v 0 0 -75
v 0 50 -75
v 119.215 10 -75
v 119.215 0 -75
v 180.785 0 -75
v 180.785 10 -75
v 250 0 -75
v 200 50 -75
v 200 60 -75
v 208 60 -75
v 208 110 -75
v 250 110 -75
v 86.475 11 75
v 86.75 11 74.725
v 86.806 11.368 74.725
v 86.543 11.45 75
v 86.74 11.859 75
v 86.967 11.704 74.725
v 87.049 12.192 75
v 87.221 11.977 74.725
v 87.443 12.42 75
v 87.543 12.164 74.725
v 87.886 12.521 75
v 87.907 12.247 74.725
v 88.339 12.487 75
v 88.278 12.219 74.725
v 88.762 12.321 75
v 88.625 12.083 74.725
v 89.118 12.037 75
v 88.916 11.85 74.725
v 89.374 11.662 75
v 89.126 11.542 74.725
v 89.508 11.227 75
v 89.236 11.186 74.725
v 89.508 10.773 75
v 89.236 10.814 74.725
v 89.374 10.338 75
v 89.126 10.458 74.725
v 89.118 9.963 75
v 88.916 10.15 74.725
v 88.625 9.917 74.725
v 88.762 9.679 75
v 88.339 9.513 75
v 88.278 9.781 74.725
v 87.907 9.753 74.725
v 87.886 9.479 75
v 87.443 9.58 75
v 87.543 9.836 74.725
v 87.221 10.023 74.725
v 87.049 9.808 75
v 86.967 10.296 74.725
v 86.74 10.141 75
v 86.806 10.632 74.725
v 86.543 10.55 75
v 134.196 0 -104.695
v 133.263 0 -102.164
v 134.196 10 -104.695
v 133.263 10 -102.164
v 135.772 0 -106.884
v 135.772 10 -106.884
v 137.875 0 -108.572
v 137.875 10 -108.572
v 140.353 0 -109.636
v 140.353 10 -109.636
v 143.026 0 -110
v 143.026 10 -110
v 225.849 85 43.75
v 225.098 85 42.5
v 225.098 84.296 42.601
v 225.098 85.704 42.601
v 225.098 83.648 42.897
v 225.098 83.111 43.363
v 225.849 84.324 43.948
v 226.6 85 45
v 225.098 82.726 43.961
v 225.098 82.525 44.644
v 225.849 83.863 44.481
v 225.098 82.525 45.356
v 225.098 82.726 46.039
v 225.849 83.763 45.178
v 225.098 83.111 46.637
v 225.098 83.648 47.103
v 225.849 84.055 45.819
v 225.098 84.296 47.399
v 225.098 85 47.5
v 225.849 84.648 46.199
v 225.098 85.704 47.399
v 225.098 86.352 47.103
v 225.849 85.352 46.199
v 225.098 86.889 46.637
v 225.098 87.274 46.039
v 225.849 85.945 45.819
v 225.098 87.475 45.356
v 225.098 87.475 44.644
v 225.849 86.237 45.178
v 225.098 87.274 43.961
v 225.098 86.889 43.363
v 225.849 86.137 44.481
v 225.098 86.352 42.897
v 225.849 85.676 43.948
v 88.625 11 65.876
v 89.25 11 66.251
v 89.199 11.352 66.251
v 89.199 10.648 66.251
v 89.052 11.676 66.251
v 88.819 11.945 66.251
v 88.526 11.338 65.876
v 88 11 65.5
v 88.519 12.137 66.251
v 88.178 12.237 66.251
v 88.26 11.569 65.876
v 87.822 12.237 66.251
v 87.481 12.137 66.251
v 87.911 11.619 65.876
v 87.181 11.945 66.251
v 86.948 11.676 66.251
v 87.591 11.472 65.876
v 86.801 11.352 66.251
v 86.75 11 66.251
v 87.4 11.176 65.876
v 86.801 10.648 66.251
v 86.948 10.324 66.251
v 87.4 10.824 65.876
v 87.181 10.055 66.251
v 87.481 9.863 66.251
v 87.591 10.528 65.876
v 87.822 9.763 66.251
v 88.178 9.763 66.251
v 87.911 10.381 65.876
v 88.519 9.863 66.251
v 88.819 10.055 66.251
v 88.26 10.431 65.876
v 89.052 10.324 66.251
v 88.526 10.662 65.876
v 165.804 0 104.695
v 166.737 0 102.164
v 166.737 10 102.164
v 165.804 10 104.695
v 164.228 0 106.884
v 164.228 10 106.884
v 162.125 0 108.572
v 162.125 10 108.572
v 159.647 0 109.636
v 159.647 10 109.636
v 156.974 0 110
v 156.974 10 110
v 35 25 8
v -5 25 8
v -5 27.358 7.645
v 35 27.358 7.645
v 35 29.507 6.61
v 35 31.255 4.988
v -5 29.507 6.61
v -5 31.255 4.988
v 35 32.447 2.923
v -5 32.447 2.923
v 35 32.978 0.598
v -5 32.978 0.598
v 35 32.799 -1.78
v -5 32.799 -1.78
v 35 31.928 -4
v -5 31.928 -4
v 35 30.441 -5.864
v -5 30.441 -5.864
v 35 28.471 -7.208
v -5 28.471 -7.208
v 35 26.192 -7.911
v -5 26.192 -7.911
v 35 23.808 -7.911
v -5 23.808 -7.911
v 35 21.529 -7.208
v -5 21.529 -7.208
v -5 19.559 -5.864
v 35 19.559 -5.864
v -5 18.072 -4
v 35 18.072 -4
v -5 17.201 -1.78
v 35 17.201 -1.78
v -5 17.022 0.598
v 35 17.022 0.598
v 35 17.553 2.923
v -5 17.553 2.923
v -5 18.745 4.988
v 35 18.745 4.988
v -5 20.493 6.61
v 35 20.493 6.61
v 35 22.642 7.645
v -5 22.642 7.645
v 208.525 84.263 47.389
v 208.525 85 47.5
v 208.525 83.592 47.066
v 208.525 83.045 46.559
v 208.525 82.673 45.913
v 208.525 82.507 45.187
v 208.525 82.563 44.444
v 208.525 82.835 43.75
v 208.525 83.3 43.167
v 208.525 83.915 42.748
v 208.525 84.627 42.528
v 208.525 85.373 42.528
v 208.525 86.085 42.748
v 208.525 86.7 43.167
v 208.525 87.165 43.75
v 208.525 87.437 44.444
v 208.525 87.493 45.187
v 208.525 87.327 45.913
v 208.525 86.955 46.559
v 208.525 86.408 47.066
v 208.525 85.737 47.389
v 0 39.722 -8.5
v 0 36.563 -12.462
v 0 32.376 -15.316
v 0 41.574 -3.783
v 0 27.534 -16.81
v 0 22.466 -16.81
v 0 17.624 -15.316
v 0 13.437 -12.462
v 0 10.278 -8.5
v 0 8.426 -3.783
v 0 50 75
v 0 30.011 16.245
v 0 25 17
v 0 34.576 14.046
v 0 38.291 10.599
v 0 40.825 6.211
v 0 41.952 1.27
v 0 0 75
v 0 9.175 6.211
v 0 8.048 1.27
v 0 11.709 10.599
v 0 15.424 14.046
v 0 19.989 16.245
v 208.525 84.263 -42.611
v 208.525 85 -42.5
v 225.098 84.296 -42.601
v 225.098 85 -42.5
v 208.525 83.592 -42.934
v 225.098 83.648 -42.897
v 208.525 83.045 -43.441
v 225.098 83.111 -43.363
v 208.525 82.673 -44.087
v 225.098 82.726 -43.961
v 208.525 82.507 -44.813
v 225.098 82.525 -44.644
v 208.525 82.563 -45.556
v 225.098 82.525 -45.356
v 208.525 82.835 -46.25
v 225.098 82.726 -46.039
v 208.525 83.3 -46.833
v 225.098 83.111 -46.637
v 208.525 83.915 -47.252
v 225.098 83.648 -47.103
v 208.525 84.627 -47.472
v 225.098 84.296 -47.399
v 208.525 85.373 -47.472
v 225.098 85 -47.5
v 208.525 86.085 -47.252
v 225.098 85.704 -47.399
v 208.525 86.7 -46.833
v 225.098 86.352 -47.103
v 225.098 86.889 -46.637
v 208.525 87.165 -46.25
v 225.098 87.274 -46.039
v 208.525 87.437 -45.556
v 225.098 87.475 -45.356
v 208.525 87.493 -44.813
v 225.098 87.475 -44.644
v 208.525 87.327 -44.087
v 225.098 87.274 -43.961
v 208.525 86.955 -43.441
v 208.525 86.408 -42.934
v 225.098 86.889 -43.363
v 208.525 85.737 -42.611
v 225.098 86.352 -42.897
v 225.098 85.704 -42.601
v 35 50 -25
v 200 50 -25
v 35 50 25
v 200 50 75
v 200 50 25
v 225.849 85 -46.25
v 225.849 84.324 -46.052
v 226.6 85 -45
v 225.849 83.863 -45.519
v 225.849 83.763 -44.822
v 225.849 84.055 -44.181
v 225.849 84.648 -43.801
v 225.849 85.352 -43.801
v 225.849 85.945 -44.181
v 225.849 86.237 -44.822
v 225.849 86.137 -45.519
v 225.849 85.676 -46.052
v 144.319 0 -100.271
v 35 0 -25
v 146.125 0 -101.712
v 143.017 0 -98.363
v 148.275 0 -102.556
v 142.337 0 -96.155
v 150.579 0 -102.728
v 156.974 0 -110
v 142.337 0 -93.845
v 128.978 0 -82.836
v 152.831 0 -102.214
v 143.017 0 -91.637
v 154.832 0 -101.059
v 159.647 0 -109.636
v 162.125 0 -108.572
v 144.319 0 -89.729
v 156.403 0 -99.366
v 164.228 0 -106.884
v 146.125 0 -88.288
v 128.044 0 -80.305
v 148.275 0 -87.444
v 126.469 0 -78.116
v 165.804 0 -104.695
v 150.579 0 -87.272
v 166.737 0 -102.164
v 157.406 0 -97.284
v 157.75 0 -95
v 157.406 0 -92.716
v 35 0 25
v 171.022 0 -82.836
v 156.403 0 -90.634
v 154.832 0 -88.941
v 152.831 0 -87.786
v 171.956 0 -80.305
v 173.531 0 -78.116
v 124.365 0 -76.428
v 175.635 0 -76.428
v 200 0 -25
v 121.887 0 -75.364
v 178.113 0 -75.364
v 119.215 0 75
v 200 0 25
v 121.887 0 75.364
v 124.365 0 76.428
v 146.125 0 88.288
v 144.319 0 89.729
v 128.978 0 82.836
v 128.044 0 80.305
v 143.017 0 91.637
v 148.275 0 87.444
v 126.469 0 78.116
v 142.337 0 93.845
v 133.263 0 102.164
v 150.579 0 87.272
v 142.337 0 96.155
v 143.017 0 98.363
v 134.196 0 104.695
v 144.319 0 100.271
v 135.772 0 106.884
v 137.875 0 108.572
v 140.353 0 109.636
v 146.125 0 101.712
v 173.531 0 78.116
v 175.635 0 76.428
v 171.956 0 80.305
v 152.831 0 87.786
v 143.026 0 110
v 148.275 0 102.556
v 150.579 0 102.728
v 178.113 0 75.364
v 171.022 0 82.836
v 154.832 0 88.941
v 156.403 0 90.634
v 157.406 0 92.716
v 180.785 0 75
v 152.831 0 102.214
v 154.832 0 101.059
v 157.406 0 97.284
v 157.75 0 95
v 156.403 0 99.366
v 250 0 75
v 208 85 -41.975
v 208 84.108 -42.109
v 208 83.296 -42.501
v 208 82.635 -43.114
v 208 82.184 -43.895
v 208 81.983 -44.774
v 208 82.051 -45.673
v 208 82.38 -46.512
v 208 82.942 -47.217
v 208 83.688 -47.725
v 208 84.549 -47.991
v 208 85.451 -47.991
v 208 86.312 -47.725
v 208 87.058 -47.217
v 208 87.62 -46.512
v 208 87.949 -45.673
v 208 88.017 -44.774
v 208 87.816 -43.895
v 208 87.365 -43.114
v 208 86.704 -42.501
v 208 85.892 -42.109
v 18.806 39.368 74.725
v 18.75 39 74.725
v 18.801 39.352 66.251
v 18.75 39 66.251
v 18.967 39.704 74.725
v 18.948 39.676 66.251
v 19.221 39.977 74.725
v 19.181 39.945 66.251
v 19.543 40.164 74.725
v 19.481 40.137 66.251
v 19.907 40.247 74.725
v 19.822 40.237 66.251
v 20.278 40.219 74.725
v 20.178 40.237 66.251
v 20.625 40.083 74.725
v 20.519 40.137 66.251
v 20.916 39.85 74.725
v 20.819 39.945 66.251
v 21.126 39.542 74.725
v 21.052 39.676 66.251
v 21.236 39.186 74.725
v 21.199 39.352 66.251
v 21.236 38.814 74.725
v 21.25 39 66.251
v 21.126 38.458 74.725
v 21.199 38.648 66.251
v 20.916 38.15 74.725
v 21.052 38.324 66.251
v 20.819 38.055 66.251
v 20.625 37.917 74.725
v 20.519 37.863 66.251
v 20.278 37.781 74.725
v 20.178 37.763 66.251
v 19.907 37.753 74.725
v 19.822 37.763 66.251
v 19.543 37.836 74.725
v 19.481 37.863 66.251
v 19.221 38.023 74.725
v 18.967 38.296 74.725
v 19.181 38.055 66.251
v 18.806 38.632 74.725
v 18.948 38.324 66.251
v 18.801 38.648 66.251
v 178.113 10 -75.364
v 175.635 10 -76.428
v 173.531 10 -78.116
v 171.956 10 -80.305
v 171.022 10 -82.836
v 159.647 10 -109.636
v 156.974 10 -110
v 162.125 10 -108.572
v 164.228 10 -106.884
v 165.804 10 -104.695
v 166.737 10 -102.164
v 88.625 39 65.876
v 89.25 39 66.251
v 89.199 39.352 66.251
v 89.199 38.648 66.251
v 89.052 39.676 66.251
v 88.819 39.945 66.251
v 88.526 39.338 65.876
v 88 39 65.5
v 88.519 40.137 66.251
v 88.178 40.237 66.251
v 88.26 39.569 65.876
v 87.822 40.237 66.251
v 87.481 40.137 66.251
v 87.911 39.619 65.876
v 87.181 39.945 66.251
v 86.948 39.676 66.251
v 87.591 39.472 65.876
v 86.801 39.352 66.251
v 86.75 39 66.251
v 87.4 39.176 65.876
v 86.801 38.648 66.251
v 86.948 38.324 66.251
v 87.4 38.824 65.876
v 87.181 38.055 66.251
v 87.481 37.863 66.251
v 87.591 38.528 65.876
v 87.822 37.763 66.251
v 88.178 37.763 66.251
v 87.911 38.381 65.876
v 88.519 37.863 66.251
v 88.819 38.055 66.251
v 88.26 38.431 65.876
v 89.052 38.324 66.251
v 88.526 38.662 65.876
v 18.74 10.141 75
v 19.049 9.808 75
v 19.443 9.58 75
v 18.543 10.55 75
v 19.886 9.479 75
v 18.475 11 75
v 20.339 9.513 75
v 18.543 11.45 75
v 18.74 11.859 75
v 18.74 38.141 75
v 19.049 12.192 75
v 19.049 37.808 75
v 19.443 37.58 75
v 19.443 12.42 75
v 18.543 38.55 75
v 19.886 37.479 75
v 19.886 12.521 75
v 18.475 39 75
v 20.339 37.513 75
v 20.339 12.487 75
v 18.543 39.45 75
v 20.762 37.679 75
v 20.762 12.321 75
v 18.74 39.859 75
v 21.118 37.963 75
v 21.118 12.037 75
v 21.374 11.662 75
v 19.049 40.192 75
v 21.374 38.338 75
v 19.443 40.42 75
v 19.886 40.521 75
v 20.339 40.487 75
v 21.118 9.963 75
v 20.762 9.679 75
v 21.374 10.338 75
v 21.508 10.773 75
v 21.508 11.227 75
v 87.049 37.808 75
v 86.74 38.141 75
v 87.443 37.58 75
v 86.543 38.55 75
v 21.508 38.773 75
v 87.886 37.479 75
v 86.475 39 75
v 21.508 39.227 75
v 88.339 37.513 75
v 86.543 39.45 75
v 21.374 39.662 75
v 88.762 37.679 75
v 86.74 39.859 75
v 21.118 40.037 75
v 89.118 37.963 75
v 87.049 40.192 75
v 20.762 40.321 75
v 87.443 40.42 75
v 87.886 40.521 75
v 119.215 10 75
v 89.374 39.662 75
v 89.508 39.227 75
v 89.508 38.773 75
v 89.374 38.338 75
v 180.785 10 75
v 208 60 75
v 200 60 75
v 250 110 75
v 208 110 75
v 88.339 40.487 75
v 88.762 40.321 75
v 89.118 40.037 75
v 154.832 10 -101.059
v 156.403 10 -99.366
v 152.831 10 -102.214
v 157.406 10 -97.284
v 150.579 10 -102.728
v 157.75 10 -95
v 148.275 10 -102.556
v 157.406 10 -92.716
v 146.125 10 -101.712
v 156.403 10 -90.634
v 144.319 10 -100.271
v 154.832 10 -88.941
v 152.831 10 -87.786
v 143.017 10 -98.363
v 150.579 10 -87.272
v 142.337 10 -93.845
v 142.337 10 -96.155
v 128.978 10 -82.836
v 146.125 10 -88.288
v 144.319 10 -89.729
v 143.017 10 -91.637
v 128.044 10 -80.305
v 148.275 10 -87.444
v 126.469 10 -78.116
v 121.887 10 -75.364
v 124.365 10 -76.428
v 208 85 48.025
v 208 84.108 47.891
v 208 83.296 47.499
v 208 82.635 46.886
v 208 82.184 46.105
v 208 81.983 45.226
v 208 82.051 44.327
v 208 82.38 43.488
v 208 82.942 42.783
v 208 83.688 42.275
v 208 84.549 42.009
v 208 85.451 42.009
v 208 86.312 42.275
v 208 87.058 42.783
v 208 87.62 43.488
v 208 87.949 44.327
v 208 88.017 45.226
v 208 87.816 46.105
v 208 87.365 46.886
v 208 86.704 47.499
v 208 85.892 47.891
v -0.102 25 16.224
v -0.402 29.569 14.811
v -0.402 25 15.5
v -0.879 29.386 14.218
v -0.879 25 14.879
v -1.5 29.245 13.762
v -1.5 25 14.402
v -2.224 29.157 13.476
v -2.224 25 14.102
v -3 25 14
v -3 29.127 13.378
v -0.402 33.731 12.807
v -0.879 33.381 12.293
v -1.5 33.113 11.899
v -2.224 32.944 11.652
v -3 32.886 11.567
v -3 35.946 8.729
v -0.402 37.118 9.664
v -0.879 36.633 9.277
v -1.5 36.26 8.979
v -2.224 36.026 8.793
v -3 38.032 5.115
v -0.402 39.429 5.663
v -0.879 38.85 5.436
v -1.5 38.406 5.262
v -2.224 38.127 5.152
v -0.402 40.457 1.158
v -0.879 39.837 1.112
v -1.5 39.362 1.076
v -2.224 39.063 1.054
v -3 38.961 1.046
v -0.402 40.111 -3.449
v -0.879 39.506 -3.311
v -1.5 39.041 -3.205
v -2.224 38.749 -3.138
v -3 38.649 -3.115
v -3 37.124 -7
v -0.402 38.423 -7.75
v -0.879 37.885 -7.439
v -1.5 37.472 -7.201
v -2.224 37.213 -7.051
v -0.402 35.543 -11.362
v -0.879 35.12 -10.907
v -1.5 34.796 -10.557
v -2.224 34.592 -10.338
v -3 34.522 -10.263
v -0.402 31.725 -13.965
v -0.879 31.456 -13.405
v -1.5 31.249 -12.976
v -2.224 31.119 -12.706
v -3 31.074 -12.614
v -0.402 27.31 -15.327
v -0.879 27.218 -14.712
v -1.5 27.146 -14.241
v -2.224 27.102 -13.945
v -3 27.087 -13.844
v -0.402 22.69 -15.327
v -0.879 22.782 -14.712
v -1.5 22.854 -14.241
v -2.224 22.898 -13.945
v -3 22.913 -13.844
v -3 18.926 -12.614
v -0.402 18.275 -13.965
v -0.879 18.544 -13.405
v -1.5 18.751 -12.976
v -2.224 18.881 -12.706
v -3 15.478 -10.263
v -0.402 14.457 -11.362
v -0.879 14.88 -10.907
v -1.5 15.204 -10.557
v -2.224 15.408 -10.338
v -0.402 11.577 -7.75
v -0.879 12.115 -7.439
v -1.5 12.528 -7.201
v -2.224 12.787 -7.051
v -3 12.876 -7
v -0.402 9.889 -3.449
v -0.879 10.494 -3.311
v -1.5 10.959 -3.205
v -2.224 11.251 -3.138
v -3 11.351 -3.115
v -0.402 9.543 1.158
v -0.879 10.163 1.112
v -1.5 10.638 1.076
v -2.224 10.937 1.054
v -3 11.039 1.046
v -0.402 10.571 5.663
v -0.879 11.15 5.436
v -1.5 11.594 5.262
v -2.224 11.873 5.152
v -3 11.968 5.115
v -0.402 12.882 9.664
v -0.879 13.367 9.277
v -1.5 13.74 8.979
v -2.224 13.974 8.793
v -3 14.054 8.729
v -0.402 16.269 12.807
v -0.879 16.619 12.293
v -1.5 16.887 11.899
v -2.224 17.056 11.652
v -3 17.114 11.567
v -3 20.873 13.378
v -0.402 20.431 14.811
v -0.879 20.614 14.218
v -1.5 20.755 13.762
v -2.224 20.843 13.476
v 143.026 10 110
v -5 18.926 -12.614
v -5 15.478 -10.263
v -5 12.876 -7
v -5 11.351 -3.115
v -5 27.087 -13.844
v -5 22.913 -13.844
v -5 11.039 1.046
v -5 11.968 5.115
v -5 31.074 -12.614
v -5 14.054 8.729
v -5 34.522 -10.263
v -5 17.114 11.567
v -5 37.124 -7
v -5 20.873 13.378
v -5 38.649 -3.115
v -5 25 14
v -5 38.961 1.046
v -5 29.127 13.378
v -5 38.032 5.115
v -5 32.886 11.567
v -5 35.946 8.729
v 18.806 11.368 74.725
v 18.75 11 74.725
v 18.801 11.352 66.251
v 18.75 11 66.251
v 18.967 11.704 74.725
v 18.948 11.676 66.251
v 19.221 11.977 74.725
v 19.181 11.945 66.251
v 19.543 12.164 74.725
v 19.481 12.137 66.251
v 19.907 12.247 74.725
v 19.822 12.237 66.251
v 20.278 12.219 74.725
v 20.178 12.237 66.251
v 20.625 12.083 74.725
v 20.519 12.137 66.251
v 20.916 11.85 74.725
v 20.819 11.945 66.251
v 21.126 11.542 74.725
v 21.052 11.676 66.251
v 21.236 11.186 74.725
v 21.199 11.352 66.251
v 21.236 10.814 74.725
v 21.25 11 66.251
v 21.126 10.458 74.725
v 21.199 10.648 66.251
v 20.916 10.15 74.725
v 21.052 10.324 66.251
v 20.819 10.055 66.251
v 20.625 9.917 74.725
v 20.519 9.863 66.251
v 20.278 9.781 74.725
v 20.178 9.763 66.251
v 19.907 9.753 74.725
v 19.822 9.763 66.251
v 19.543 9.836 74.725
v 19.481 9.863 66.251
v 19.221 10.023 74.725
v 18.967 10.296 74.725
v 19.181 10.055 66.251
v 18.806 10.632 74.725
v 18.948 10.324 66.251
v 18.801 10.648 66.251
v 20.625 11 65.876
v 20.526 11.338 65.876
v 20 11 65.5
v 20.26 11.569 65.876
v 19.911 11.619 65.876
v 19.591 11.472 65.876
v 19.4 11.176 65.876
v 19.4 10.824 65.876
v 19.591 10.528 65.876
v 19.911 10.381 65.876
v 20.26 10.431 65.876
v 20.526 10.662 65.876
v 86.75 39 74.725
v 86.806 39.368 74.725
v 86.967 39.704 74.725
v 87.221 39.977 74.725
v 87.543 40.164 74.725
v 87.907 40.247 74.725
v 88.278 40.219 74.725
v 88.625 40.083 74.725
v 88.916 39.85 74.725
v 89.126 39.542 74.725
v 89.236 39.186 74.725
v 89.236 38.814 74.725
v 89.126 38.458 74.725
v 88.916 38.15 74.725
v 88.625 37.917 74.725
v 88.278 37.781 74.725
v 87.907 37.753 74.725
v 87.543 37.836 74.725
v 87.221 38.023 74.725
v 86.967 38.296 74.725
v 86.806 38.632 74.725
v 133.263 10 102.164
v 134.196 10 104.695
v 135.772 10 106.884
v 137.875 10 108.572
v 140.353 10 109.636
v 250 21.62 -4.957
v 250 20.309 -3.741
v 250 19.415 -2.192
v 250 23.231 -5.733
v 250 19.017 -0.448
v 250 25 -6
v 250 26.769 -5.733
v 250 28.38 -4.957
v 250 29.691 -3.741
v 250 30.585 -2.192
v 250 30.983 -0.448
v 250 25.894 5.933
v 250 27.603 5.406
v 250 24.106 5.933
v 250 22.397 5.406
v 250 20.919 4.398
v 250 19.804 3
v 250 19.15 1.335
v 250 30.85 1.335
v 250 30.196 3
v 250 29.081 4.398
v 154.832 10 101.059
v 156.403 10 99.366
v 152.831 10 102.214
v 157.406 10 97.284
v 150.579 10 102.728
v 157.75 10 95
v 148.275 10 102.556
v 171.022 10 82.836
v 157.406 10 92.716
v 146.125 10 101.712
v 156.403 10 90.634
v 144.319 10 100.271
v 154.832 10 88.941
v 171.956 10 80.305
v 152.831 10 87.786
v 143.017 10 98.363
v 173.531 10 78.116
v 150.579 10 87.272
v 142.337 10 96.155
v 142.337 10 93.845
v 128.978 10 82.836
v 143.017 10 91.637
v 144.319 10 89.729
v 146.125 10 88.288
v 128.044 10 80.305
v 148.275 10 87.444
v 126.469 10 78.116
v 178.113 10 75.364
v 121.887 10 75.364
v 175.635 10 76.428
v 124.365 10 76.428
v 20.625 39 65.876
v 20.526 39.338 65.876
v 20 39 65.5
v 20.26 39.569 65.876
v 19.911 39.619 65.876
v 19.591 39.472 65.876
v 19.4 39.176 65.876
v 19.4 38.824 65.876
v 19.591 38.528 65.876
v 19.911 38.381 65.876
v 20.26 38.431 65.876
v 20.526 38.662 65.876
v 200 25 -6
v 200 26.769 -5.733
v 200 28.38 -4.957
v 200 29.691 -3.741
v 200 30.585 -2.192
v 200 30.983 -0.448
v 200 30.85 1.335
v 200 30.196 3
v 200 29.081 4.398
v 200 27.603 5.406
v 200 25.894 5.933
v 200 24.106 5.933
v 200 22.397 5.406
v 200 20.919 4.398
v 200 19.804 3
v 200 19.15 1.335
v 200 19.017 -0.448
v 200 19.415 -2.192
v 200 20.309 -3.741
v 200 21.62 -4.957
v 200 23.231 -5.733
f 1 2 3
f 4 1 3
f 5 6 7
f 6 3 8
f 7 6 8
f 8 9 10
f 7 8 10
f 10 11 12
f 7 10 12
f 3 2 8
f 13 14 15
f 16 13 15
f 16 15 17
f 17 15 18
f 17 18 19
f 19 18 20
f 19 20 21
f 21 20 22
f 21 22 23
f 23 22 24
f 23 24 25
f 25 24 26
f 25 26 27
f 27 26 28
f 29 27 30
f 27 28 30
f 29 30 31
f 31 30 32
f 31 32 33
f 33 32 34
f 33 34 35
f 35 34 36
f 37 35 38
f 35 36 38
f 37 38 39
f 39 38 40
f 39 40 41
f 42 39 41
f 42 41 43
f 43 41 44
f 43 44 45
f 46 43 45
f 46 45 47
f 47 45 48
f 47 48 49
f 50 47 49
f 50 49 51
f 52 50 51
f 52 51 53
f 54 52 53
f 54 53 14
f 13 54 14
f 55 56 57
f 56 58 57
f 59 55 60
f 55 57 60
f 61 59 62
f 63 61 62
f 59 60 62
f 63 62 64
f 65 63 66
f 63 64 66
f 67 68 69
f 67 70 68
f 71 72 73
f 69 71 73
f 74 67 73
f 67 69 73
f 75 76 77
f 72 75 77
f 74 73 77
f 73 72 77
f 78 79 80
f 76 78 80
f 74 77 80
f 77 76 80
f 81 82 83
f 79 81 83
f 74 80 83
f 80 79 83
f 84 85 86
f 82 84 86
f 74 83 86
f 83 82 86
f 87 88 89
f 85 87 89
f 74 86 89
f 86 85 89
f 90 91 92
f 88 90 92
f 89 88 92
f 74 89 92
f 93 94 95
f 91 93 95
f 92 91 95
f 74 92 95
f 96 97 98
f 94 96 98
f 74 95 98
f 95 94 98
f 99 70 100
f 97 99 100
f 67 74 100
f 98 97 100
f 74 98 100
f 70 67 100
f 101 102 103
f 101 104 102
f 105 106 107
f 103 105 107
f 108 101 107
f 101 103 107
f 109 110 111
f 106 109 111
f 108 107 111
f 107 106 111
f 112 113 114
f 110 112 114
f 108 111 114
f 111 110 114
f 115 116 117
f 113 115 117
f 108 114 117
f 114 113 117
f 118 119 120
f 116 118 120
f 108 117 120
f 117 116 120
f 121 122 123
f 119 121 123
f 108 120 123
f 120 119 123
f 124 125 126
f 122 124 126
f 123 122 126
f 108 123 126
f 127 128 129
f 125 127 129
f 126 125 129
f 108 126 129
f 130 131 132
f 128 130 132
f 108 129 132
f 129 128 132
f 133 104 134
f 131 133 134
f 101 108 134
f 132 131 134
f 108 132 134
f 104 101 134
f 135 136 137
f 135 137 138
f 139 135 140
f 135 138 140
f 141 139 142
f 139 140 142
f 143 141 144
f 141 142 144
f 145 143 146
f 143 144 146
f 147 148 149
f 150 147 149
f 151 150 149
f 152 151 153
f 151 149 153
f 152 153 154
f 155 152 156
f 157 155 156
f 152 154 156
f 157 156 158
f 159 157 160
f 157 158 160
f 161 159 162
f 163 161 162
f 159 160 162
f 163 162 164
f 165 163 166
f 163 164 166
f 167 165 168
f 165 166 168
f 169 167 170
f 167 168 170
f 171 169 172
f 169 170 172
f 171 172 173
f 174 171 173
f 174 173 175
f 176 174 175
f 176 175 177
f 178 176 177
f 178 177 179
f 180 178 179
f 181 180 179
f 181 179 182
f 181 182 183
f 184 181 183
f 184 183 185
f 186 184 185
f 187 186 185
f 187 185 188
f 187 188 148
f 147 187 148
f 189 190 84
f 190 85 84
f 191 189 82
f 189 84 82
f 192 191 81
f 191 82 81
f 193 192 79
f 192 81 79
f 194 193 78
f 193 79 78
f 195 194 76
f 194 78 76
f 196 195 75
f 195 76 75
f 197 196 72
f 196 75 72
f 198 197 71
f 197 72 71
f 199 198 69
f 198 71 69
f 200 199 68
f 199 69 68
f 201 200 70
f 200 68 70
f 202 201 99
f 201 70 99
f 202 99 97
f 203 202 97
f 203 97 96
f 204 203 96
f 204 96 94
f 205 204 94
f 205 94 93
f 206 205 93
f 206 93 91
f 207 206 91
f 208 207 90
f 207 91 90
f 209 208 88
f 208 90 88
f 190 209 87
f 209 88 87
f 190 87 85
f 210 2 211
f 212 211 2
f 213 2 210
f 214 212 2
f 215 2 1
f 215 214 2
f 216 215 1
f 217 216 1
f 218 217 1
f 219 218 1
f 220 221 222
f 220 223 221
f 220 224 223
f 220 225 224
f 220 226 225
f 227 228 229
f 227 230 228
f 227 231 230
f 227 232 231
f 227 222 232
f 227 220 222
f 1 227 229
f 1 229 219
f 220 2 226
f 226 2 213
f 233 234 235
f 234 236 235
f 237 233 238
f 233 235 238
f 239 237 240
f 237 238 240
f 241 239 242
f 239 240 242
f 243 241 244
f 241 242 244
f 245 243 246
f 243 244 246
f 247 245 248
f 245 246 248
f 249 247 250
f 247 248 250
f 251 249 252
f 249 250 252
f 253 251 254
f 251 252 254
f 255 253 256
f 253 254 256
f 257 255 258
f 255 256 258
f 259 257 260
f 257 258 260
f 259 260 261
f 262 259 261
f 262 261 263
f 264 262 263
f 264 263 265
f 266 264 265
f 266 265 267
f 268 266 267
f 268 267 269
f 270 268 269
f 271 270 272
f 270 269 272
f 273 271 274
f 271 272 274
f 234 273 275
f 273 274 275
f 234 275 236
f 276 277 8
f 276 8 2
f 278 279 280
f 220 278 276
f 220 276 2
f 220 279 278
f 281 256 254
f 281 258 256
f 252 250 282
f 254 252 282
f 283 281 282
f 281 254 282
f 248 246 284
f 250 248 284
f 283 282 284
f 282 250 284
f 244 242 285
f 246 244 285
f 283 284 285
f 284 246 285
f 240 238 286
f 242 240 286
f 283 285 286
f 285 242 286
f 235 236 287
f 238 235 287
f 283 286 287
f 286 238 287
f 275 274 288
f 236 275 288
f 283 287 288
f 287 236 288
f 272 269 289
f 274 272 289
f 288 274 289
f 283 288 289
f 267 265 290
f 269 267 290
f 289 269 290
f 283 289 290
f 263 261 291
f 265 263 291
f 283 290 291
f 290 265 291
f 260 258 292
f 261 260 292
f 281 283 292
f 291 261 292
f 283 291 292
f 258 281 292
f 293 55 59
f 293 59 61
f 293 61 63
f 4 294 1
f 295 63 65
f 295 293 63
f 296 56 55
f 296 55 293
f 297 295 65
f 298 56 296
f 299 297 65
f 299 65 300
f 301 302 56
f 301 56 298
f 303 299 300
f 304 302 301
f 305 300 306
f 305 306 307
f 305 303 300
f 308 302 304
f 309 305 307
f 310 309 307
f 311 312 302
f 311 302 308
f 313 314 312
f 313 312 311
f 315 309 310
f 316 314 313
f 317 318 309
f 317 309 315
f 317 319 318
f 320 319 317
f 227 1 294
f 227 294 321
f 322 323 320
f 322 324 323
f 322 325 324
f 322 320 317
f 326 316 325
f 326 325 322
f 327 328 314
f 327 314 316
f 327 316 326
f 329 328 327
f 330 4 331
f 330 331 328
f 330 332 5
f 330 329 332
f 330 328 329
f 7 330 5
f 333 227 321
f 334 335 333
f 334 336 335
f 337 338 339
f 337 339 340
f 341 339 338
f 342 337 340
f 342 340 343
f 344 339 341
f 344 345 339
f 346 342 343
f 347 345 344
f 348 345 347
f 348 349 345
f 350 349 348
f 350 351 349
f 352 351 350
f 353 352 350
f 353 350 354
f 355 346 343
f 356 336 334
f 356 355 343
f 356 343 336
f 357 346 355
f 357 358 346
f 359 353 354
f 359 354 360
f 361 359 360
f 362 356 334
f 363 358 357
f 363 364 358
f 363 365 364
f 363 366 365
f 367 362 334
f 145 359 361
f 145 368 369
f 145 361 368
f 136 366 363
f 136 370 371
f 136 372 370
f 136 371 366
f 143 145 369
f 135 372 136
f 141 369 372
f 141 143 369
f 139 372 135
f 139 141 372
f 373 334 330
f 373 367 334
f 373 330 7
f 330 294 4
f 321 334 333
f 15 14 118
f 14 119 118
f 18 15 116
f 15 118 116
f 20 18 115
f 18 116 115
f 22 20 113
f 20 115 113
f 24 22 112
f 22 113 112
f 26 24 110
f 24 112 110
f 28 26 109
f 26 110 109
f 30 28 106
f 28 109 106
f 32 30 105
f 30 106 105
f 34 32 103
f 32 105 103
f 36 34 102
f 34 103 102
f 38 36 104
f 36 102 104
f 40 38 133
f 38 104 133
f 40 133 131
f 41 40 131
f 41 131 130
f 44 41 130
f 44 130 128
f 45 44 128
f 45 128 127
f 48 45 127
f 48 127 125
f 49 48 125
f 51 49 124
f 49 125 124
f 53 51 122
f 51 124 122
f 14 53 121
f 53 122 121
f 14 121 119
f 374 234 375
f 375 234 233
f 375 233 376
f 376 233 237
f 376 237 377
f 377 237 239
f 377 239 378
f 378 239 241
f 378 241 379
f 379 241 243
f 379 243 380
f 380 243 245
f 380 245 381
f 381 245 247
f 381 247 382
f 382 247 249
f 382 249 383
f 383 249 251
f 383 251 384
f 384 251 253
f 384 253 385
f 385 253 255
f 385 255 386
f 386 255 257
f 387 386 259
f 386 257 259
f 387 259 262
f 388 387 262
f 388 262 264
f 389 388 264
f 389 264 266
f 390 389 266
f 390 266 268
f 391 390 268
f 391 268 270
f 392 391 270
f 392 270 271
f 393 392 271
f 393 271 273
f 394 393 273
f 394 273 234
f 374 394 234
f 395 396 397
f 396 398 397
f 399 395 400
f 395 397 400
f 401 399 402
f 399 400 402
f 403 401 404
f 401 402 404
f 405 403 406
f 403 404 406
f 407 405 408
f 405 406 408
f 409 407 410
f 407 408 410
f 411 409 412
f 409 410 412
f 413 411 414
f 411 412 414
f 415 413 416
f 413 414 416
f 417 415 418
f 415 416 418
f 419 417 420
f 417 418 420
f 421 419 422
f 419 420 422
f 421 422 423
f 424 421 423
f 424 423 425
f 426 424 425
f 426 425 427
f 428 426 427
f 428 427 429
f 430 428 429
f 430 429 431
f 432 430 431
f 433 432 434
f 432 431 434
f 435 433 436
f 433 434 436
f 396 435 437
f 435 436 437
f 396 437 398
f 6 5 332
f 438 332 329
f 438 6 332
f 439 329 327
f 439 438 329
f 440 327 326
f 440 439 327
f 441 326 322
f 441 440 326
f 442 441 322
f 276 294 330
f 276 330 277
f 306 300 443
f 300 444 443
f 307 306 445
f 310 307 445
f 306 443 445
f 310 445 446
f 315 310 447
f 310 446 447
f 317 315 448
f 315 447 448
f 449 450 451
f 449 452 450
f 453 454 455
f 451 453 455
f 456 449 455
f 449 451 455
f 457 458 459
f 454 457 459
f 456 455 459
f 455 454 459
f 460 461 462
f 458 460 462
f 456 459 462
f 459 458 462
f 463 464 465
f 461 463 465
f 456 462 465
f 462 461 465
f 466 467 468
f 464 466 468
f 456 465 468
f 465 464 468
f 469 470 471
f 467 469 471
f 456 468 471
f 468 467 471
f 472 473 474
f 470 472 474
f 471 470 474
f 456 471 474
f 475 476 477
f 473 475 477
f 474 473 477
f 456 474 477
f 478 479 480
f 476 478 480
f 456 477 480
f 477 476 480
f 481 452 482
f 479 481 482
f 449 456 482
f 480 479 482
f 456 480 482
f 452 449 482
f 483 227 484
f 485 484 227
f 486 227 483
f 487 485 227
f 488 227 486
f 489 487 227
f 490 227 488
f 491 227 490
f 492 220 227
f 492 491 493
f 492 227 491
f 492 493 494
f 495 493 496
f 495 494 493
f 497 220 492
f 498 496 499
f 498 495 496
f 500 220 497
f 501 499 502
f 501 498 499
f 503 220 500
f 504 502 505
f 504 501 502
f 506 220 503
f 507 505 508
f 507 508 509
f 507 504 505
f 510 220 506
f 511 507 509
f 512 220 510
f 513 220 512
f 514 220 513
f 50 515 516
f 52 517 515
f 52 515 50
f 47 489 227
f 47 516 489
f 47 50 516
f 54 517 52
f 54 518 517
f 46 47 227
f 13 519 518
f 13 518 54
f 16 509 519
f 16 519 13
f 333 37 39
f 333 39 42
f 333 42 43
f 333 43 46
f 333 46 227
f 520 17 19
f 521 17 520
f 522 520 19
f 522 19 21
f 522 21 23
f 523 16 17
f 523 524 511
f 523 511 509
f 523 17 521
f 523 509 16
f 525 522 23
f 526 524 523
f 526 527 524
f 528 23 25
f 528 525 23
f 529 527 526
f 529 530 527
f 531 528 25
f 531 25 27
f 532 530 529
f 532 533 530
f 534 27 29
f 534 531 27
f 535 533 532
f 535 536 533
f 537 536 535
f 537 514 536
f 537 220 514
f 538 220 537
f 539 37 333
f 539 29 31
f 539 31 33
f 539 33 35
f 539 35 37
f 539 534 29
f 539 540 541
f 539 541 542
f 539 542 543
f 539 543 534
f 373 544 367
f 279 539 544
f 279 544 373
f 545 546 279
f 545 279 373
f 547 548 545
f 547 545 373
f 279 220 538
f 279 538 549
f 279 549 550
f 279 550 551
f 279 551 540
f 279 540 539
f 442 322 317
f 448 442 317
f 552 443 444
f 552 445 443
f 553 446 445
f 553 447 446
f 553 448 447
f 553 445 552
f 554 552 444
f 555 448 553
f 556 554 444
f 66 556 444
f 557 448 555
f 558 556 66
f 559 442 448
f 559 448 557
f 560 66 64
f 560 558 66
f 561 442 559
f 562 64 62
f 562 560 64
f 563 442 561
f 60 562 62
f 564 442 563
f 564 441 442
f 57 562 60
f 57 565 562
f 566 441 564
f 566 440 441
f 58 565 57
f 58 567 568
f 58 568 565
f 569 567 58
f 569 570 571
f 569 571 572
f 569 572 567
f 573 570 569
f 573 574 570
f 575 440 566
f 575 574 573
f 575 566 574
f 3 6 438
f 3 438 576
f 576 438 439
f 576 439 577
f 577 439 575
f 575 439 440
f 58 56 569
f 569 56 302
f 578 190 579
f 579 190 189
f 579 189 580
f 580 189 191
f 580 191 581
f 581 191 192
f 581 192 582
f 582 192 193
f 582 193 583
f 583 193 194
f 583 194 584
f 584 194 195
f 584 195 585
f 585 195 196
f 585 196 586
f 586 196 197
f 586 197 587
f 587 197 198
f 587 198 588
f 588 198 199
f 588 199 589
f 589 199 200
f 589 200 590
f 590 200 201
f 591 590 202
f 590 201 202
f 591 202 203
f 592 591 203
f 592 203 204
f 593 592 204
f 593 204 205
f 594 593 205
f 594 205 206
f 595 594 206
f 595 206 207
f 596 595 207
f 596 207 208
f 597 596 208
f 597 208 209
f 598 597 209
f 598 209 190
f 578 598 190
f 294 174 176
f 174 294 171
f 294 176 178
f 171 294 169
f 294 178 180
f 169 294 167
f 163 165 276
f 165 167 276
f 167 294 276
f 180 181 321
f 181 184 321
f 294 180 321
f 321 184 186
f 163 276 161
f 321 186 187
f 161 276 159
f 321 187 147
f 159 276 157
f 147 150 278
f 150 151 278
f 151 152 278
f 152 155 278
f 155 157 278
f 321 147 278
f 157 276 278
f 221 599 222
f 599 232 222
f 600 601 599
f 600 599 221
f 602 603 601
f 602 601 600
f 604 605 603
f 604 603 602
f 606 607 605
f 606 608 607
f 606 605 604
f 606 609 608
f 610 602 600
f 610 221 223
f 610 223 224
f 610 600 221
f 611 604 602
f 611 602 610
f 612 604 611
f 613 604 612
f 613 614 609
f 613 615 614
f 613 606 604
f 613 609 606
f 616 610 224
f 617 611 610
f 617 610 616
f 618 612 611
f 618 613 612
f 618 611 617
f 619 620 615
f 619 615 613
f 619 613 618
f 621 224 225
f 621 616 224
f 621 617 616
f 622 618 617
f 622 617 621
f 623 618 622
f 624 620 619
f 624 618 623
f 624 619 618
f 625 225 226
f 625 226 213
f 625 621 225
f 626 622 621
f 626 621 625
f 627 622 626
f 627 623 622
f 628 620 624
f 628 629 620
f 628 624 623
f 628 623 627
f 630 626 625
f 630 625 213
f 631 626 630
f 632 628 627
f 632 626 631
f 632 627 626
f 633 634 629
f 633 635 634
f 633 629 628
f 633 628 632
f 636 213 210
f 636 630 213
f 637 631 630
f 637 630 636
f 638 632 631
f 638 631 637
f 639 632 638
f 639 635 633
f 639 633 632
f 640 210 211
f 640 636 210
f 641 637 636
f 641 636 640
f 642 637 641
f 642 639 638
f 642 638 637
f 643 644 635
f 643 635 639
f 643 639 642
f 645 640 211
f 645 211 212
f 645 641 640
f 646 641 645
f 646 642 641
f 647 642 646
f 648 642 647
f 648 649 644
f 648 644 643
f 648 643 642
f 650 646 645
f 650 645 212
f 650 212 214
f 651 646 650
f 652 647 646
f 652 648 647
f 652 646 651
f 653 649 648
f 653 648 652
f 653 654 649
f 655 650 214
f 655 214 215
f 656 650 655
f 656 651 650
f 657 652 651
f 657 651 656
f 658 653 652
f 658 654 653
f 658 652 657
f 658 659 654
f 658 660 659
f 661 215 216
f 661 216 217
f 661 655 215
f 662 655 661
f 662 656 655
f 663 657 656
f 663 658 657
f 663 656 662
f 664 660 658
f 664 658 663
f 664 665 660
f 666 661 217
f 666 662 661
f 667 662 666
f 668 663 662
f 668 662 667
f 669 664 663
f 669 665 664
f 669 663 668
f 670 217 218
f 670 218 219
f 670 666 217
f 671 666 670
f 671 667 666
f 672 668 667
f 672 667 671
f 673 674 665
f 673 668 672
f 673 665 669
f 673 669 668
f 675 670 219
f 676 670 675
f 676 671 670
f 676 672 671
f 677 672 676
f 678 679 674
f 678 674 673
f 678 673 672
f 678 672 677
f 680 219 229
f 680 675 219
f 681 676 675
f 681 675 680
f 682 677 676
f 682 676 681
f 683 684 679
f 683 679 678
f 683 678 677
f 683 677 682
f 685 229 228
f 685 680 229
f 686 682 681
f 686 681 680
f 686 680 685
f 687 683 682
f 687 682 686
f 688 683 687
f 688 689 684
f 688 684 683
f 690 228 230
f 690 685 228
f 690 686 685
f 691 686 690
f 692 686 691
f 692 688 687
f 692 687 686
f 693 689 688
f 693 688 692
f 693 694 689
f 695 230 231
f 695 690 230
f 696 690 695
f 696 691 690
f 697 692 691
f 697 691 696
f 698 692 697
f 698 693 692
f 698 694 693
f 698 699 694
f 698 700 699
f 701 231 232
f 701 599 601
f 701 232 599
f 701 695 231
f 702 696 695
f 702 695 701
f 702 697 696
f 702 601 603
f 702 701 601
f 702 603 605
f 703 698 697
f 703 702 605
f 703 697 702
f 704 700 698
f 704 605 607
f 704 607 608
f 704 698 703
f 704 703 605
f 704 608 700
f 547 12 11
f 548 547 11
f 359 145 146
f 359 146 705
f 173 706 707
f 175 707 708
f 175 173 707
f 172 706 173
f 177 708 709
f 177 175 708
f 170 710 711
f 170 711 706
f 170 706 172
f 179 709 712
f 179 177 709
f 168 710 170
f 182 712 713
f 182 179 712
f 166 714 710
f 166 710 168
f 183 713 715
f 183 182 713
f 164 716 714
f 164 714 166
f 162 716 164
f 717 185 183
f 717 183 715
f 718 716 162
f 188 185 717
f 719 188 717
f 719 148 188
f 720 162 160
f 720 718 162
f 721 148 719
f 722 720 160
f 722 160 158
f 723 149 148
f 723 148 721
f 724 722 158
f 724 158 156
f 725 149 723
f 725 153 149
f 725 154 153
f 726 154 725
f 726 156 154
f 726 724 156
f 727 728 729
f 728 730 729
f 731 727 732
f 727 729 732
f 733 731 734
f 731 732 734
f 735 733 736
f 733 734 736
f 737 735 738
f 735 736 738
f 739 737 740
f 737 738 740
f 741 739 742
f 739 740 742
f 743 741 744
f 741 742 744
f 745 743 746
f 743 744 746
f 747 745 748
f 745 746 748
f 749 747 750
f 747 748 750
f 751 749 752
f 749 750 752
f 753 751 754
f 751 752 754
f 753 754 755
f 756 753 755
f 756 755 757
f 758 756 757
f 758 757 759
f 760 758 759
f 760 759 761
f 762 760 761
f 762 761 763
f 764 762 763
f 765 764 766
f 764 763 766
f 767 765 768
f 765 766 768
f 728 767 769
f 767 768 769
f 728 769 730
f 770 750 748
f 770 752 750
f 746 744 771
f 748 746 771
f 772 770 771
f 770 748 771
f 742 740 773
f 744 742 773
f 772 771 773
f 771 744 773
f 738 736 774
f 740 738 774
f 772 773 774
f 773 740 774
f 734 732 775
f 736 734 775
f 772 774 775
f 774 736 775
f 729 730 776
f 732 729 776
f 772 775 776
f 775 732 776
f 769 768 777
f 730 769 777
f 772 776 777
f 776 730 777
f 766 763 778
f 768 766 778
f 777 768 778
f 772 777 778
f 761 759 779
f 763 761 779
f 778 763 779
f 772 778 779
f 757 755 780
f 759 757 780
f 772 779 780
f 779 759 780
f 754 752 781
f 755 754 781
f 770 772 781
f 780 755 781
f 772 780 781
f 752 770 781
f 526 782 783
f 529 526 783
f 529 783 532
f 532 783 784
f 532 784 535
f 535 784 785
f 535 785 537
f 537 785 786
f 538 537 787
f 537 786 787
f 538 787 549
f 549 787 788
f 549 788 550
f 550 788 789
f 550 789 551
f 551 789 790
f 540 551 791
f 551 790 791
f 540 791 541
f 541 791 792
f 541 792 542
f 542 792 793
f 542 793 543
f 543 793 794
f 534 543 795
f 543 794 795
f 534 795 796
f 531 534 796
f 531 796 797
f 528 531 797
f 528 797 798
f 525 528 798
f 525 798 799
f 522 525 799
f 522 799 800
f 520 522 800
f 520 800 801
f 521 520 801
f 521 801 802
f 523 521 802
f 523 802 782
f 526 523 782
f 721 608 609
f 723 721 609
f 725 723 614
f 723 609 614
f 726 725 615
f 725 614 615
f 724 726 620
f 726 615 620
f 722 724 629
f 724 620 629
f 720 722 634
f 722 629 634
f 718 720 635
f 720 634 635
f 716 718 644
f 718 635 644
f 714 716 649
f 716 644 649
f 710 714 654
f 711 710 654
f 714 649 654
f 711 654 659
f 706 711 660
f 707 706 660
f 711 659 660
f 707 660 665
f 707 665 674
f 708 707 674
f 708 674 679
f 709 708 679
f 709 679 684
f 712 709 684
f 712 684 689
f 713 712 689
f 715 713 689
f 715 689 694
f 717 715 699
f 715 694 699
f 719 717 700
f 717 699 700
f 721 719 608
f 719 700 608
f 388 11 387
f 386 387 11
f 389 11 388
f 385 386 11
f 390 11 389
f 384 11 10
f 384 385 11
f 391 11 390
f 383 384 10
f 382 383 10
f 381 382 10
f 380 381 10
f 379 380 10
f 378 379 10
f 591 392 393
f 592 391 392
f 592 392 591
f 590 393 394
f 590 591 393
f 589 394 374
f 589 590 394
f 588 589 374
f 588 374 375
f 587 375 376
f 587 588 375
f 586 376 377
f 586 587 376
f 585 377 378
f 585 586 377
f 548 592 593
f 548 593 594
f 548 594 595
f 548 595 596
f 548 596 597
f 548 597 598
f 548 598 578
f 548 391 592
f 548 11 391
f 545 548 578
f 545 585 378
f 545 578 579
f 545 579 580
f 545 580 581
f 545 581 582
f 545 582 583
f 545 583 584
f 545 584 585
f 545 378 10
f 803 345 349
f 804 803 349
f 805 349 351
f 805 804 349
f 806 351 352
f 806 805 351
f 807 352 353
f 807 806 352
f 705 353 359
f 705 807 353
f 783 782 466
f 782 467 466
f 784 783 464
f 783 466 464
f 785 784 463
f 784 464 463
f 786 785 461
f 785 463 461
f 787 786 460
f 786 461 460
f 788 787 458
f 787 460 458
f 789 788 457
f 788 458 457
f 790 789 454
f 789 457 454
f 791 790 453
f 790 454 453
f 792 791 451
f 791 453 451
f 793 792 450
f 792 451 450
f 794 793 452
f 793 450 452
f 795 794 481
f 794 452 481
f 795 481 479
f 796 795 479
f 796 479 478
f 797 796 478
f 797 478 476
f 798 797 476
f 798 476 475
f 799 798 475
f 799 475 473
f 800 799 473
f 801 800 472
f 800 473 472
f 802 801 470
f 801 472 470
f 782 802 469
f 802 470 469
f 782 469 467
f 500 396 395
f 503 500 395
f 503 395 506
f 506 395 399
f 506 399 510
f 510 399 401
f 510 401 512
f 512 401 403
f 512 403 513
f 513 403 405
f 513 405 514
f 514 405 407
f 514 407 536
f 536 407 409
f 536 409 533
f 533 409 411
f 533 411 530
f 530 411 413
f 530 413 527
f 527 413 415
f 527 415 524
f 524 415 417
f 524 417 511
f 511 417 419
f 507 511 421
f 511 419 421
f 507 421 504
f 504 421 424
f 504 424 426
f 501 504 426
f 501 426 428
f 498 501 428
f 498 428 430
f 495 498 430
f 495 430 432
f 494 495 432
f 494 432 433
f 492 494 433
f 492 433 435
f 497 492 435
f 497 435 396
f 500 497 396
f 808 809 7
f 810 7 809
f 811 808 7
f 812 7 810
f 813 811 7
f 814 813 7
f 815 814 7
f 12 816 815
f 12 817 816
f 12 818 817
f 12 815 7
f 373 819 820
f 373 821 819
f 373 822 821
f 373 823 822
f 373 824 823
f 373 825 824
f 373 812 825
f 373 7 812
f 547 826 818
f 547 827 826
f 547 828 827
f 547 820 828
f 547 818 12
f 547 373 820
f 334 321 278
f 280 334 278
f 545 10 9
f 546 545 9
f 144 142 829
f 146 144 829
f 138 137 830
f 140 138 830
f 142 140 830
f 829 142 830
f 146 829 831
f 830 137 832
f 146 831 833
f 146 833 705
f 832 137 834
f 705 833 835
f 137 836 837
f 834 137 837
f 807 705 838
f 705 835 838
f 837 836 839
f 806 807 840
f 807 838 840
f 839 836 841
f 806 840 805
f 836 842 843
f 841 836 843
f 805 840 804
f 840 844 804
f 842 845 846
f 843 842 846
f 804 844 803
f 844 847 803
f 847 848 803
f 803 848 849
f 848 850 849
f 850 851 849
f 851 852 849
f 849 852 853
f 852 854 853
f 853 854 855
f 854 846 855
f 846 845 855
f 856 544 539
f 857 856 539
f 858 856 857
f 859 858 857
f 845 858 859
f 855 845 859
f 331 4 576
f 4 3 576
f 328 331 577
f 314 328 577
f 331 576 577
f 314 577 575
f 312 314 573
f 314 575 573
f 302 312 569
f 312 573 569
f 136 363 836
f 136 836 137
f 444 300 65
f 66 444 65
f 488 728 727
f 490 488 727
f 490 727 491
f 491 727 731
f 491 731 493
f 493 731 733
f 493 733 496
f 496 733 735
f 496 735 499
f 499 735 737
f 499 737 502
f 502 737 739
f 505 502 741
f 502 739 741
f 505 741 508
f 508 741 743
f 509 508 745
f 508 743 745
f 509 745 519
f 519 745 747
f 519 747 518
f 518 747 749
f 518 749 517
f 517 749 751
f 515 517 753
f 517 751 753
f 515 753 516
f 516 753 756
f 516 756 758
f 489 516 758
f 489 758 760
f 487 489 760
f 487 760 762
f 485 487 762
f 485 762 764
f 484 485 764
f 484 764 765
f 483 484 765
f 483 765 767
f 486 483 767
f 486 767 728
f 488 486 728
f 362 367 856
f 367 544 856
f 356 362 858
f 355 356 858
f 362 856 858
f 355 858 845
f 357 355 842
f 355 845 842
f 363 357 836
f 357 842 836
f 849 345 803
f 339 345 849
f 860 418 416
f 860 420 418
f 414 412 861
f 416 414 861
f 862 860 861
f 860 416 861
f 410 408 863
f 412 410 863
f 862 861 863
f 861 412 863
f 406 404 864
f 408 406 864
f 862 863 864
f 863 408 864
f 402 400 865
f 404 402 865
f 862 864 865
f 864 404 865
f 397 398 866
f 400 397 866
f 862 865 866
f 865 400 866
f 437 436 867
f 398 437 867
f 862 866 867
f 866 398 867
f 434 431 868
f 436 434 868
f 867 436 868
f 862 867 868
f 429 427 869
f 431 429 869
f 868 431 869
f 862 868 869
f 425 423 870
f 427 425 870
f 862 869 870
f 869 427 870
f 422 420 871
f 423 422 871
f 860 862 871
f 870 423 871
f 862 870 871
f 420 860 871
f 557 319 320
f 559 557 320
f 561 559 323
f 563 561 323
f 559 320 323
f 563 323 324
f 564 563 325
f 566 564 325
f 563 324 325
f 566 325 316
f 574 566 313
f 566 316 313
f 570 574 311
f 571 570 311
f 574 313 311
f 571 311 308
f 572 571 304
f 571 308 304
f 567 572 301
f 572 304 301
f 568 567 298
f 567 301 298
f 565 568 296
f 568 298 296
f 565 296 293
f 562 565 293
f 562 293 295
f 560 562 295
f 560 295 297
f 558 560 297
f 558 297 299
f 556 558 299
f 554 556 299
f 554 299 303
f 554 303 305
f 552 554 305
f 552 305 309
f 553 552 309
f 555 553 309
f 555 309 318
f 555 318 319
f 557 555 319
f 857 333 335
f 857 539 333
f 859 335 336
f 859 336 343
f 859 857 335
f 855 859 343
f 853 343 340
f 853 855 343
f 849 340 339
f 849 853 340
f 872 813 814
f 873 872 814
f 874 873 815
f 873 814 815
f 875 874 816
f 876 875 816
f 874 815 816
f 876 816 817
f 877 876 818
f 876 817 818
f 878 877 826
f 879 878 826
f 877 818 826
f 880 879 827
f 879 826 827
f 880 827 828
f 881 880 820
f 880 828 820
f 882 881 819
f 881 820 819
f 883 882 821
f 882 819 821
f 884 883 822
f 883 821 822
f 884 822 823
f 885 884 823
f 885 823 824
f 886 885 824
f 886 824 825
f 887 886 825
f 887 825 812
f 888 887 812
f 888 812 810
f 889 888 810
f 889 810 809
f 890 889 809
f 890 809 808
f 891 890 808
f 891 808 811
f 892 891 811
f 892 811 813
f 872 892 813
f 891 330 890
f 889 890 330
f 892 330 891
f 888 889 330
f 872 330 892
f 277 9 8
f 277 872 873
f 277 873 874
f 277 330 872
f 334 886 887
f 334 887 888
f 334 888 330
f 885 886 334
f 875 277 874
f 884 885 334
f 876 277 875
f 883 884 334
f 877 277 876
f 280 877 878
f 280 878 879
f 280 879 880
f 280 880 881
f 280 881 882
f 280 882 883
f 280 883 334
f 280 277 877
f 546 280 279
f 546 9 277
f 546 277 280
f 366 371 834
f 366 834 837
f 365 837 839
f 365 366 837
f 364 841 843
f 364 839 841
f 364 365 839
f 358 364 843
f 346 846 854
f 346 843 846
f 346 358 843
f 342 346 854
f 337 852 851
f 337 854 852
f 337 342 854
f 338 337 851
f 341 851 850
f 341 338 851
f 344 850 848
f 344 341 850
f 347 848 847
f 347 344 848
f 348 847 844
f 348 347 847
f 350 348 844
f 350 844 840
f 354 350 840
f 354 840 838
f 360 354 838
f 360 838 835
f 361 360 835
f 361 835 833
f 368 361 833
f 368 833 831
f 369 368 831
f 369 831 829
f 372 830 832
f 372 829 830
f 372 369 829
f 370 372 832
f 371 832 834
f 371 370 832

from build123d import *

# Parameters (mm, degrees)
BOSS_EXTRUDE2_DEPTH             = 75
CUT_EXTRUDE1_START              = -35
SKETCH3_W                       = 50
SKETCH3_H                       = 50
CUT_EXTRUDE1_DEPTH              = 165
SKETCH4_R                       = 14
BOSS_EXTRUDE3_DEPTH             = 5
CUT_EXTRUDE2_REACH              = 257
SKETCH5_R                       = 6
CUT_EXTRUDE2_DIRECTION_2_DEPTH  = 1
CUT_EXTRUDE4_REACH              = 257
SKETCH9_R                       = 8
FILLET2_R                       = 3
M6X1_0_TAPPED_HOLE2_D           = 5
M6X1_0_TAPPED_HOLE2_DEPTH       = 17.097848452
M6X1_0_TAPPED_HOLE2_CSINK_D     = 6.05
M6X1_0_TAPPED_HOLE2_CSINK_ANGLE = 90
M6X1_0_TAPPED_HOLE2_TIP         = 1.502151548
M3X0_5_TAPPED_HOLE1_D           = 2.5
M3X0_5_TAPPED_HOLE1_DEPTH       = 8.748924226
M3X0_5_TAPPED_HOLE1_CSINK_D     = 3.05
M3X0_5_TAPPED_HOLE1_CSINK_ANGLE = 90
M3X0_5_TAPPED_HOLE1_TIP         = 0.751075774
BOSS_EXTRUDE4_DEPTH             = 10
CUT_EXTRUDE5_START              = -11
SKETCH17_R                      = 7.75
CUT_EXTRUDE5_DEPTH              = 112
FILLET3_R                       = 10
FILLET4_R                       = 10


with BuildPart() as part:
    # Sketch1 → Boss-Extrude2 (new body, symmetric)
    with BuildSketch(Plane.XY):
        Polygon((0, 0), (250, 0), (250, 110), (208, 110), (208, 60), (200, 60), (200, 50), (0, 50), align=None)
    extrude(amount=BOSS_EXTRUDE2_DEPTH, both=True)

    # Sketch3 → Cut-Extrude1 (cut)
    with BuildSketch(Plane.ZY.offset(CUT_EXTRUDE1_START)):
        with Locations((0, 25)):
            Rectangle(SKETCH3_W, SKETCH3_H)
    extrude(amount=-CUT_EXTRUDE1_DEPTH, mode=Mode.SUBTRACT)

    # Sketch4 → Boss-Extrude3 (add)
    with BuildSketch(Plane.ZY):
        with Locations((0, 25)):
            Circle(SKETCH4_R)
    extrude(amount=BOSS_EXTRUDE3_DEPTH)

    # Sketch5 → Cut-Extrude2 (cut, up to next)
    with BuildSketch(Plane(origin=(250, 0, 0), x_dir=(0, 0, -1), z_dir=(1, 0, 0)), mode=Mode.PRIVATE) as cut_extrude2_sk1:
        with Locations((0, 25)):
            Circle(SKETCH5_R)
    cut_extrude2_tool1 = extrude(cut_extrude2_sk1.sketch, amount=-CUT_EXTRUDE2_REACH, mode=Mode.PRIVATE) & part.part
    add(cut_extrude2_tool1.solids().sort_by_distance((250, 25, 0))[0], mode=Mode.SUBTRACT)

    # Sketch5 → Cut-Extrude2 direction 2 (cut)
    with BuildSketch(Plane(origin=(250, 0, 0), x_dir=(0, 0, -1), z_dir=(1, 0, 0))):
        with Locations((0, 25)):
            Circle(SKETCH5_R)
    extrude(amount=CUT_EXTRUDE2_DIRECTION_2_DEPTH, mode=Mode.SUBTRACT)

    # Sketch9 → Cut-Extrude4 (cut, up to next)
    with BuildSketch(Plane.ZY.offset(5), mode=Mode.PRIVATE) as cut_extrude4_sk1:
        with Locations((0, 25)):
            Circle(SKETCH9_R)
    cut_extrude4_tool1 = extrude(cut_extrude4_sk1.sketch, amount=-CUT_EXTRUDE4_REACH, mode=Mode.PRIVATE) & part.part
    add(cut_extrude4_tool1.solids().sort_by_distance((-5, 25, 0))[0], mode=Mode.SUBTRACT)

    # Fillet2
    fillet2_edges = [part.edges().sort_by_distance(p)[0] for p in [
        (0, 25, -14),
    ]]
    fillet(fillet2_edges, radius=FILLET2_R)

    # M6x1.0 Tapped Hole2
    with Locations(Plane(origin=(208, 85, -45), x_dir=(0, 0, -1), z_dir=(-1, 0, 0))):
        with Locations((0, 0), (-90, 0)):
            CounterSinkHole(M6X1_0_TAPPED_HOLE2_D / 2, M6X1_0_TAPPED_HOLE2_CSINK_D / 2, depth=M6X1_0_TAPPED_HOLE2_DEPTH, counter_sink_angle=M6X1_0_TAPPED_HOLE2_CSINK_ANGLE)
            with Locations((0, 0, -(M6X1_0_TAPPED_HOLE2_DEPTH + M6X1_0_TAPPED_HOLE2_TIP / 2))):  # 118° drill point
                Cone(0, M6X1_0_TAPPED_HOLE2_D / 2, M6X1_0_TAPPED_HOLE2_TIP, mode=Mode.SUBTRACT)

    # M3x0.5 Tapped Hole1
    with Locations(Plane(origin=(20, 39, 75), x_dir=(1, 0, 0), z_dir=(0, 0, 1))):
        with Locations((0, 0), (68, 0), (68, -28), (0, -28)):
            CounterSinkHole(M3X0_5_TAPPED_HOLE1_D / 2, M3X0_5_TAPPED_HOLE1_CSINK_D / 2, depth=M3X0_5_TAPPED_HOLE1_DEPTH, counter_sink_angle=M3X0_5_TAPPED_HOLE1_CSINK_ANGLE)
            with Locations((0, 0, -(M3X0_5_TAPPED_HOLE1_DEPTH + M3X0_5_TAPPED_HOLE1_TIP / 2))):  # 118° drill point
                Cone(0, M3X0_5_TAPPED_HOLE1_D / 2, M3X0_5_TAPPED_HOLE1_TIP, mode=Mode.SUBTRACT)

    # Sketch15 → Boss-Extrude4 (add)
    with BuildSketch(Plane(origin=(0, 0, 0), x_dir=(1, 0, 0), z_dir=(0, 1, 0))):
        Polygon((127.240686807, -75), (172.759313193, -75), (165, -110), (135, -110), align=None)
    boss_extrude4 = extrude(amount=BOSS_EXTRUDE4_DEPTH)

    # Sketch17 → Cut-Extrude5 (cut)
    with BuildSketch(Plane(origin=(0, 10, 0), x_dir=(1, 0, 0), z_dir=(0, 1, 0)).offset(CUT_EXTRUDE5_START)):
        with Locations((150, -95)):
            Circle(SKETCH17_R)
    cut_extrude5 = extrude(amount=CUT_EXTRUDE5_DEPTH, mode=Mode.SUBTRACT)

    # Fillet3
    fillet3_edges = [part.edges().sort_by_distance(p)[0] for p in [
        (135, 5, 110),
        (165, 5, 110),
        (172.759313193, 5, 75),
        (127.240686807, 5, 75),
    ]]
    fillet(fillet3_edges, radius=FILLET3_R)

    # Mirror3: Boss-Extrude4, Cut-Extrude5 across plane
    add(boss_extrude4.mirror(Plane.XY))
    add(cut_extrude5.mirror(Plane.XY), mode=Mode.SUBTRACT)

    # Fillet4
    fillet4_edges = [part.edges().sort_by_distance(p)[0] for p in [
        (165, 5, -110),
        (135, 5, -110),
        (127.240686807, 5, -75),
        (172.759313193, 5, -75),
    ]]
    fillet(fillet4_edges, radius=FILLET4_R)


solid = part.part
